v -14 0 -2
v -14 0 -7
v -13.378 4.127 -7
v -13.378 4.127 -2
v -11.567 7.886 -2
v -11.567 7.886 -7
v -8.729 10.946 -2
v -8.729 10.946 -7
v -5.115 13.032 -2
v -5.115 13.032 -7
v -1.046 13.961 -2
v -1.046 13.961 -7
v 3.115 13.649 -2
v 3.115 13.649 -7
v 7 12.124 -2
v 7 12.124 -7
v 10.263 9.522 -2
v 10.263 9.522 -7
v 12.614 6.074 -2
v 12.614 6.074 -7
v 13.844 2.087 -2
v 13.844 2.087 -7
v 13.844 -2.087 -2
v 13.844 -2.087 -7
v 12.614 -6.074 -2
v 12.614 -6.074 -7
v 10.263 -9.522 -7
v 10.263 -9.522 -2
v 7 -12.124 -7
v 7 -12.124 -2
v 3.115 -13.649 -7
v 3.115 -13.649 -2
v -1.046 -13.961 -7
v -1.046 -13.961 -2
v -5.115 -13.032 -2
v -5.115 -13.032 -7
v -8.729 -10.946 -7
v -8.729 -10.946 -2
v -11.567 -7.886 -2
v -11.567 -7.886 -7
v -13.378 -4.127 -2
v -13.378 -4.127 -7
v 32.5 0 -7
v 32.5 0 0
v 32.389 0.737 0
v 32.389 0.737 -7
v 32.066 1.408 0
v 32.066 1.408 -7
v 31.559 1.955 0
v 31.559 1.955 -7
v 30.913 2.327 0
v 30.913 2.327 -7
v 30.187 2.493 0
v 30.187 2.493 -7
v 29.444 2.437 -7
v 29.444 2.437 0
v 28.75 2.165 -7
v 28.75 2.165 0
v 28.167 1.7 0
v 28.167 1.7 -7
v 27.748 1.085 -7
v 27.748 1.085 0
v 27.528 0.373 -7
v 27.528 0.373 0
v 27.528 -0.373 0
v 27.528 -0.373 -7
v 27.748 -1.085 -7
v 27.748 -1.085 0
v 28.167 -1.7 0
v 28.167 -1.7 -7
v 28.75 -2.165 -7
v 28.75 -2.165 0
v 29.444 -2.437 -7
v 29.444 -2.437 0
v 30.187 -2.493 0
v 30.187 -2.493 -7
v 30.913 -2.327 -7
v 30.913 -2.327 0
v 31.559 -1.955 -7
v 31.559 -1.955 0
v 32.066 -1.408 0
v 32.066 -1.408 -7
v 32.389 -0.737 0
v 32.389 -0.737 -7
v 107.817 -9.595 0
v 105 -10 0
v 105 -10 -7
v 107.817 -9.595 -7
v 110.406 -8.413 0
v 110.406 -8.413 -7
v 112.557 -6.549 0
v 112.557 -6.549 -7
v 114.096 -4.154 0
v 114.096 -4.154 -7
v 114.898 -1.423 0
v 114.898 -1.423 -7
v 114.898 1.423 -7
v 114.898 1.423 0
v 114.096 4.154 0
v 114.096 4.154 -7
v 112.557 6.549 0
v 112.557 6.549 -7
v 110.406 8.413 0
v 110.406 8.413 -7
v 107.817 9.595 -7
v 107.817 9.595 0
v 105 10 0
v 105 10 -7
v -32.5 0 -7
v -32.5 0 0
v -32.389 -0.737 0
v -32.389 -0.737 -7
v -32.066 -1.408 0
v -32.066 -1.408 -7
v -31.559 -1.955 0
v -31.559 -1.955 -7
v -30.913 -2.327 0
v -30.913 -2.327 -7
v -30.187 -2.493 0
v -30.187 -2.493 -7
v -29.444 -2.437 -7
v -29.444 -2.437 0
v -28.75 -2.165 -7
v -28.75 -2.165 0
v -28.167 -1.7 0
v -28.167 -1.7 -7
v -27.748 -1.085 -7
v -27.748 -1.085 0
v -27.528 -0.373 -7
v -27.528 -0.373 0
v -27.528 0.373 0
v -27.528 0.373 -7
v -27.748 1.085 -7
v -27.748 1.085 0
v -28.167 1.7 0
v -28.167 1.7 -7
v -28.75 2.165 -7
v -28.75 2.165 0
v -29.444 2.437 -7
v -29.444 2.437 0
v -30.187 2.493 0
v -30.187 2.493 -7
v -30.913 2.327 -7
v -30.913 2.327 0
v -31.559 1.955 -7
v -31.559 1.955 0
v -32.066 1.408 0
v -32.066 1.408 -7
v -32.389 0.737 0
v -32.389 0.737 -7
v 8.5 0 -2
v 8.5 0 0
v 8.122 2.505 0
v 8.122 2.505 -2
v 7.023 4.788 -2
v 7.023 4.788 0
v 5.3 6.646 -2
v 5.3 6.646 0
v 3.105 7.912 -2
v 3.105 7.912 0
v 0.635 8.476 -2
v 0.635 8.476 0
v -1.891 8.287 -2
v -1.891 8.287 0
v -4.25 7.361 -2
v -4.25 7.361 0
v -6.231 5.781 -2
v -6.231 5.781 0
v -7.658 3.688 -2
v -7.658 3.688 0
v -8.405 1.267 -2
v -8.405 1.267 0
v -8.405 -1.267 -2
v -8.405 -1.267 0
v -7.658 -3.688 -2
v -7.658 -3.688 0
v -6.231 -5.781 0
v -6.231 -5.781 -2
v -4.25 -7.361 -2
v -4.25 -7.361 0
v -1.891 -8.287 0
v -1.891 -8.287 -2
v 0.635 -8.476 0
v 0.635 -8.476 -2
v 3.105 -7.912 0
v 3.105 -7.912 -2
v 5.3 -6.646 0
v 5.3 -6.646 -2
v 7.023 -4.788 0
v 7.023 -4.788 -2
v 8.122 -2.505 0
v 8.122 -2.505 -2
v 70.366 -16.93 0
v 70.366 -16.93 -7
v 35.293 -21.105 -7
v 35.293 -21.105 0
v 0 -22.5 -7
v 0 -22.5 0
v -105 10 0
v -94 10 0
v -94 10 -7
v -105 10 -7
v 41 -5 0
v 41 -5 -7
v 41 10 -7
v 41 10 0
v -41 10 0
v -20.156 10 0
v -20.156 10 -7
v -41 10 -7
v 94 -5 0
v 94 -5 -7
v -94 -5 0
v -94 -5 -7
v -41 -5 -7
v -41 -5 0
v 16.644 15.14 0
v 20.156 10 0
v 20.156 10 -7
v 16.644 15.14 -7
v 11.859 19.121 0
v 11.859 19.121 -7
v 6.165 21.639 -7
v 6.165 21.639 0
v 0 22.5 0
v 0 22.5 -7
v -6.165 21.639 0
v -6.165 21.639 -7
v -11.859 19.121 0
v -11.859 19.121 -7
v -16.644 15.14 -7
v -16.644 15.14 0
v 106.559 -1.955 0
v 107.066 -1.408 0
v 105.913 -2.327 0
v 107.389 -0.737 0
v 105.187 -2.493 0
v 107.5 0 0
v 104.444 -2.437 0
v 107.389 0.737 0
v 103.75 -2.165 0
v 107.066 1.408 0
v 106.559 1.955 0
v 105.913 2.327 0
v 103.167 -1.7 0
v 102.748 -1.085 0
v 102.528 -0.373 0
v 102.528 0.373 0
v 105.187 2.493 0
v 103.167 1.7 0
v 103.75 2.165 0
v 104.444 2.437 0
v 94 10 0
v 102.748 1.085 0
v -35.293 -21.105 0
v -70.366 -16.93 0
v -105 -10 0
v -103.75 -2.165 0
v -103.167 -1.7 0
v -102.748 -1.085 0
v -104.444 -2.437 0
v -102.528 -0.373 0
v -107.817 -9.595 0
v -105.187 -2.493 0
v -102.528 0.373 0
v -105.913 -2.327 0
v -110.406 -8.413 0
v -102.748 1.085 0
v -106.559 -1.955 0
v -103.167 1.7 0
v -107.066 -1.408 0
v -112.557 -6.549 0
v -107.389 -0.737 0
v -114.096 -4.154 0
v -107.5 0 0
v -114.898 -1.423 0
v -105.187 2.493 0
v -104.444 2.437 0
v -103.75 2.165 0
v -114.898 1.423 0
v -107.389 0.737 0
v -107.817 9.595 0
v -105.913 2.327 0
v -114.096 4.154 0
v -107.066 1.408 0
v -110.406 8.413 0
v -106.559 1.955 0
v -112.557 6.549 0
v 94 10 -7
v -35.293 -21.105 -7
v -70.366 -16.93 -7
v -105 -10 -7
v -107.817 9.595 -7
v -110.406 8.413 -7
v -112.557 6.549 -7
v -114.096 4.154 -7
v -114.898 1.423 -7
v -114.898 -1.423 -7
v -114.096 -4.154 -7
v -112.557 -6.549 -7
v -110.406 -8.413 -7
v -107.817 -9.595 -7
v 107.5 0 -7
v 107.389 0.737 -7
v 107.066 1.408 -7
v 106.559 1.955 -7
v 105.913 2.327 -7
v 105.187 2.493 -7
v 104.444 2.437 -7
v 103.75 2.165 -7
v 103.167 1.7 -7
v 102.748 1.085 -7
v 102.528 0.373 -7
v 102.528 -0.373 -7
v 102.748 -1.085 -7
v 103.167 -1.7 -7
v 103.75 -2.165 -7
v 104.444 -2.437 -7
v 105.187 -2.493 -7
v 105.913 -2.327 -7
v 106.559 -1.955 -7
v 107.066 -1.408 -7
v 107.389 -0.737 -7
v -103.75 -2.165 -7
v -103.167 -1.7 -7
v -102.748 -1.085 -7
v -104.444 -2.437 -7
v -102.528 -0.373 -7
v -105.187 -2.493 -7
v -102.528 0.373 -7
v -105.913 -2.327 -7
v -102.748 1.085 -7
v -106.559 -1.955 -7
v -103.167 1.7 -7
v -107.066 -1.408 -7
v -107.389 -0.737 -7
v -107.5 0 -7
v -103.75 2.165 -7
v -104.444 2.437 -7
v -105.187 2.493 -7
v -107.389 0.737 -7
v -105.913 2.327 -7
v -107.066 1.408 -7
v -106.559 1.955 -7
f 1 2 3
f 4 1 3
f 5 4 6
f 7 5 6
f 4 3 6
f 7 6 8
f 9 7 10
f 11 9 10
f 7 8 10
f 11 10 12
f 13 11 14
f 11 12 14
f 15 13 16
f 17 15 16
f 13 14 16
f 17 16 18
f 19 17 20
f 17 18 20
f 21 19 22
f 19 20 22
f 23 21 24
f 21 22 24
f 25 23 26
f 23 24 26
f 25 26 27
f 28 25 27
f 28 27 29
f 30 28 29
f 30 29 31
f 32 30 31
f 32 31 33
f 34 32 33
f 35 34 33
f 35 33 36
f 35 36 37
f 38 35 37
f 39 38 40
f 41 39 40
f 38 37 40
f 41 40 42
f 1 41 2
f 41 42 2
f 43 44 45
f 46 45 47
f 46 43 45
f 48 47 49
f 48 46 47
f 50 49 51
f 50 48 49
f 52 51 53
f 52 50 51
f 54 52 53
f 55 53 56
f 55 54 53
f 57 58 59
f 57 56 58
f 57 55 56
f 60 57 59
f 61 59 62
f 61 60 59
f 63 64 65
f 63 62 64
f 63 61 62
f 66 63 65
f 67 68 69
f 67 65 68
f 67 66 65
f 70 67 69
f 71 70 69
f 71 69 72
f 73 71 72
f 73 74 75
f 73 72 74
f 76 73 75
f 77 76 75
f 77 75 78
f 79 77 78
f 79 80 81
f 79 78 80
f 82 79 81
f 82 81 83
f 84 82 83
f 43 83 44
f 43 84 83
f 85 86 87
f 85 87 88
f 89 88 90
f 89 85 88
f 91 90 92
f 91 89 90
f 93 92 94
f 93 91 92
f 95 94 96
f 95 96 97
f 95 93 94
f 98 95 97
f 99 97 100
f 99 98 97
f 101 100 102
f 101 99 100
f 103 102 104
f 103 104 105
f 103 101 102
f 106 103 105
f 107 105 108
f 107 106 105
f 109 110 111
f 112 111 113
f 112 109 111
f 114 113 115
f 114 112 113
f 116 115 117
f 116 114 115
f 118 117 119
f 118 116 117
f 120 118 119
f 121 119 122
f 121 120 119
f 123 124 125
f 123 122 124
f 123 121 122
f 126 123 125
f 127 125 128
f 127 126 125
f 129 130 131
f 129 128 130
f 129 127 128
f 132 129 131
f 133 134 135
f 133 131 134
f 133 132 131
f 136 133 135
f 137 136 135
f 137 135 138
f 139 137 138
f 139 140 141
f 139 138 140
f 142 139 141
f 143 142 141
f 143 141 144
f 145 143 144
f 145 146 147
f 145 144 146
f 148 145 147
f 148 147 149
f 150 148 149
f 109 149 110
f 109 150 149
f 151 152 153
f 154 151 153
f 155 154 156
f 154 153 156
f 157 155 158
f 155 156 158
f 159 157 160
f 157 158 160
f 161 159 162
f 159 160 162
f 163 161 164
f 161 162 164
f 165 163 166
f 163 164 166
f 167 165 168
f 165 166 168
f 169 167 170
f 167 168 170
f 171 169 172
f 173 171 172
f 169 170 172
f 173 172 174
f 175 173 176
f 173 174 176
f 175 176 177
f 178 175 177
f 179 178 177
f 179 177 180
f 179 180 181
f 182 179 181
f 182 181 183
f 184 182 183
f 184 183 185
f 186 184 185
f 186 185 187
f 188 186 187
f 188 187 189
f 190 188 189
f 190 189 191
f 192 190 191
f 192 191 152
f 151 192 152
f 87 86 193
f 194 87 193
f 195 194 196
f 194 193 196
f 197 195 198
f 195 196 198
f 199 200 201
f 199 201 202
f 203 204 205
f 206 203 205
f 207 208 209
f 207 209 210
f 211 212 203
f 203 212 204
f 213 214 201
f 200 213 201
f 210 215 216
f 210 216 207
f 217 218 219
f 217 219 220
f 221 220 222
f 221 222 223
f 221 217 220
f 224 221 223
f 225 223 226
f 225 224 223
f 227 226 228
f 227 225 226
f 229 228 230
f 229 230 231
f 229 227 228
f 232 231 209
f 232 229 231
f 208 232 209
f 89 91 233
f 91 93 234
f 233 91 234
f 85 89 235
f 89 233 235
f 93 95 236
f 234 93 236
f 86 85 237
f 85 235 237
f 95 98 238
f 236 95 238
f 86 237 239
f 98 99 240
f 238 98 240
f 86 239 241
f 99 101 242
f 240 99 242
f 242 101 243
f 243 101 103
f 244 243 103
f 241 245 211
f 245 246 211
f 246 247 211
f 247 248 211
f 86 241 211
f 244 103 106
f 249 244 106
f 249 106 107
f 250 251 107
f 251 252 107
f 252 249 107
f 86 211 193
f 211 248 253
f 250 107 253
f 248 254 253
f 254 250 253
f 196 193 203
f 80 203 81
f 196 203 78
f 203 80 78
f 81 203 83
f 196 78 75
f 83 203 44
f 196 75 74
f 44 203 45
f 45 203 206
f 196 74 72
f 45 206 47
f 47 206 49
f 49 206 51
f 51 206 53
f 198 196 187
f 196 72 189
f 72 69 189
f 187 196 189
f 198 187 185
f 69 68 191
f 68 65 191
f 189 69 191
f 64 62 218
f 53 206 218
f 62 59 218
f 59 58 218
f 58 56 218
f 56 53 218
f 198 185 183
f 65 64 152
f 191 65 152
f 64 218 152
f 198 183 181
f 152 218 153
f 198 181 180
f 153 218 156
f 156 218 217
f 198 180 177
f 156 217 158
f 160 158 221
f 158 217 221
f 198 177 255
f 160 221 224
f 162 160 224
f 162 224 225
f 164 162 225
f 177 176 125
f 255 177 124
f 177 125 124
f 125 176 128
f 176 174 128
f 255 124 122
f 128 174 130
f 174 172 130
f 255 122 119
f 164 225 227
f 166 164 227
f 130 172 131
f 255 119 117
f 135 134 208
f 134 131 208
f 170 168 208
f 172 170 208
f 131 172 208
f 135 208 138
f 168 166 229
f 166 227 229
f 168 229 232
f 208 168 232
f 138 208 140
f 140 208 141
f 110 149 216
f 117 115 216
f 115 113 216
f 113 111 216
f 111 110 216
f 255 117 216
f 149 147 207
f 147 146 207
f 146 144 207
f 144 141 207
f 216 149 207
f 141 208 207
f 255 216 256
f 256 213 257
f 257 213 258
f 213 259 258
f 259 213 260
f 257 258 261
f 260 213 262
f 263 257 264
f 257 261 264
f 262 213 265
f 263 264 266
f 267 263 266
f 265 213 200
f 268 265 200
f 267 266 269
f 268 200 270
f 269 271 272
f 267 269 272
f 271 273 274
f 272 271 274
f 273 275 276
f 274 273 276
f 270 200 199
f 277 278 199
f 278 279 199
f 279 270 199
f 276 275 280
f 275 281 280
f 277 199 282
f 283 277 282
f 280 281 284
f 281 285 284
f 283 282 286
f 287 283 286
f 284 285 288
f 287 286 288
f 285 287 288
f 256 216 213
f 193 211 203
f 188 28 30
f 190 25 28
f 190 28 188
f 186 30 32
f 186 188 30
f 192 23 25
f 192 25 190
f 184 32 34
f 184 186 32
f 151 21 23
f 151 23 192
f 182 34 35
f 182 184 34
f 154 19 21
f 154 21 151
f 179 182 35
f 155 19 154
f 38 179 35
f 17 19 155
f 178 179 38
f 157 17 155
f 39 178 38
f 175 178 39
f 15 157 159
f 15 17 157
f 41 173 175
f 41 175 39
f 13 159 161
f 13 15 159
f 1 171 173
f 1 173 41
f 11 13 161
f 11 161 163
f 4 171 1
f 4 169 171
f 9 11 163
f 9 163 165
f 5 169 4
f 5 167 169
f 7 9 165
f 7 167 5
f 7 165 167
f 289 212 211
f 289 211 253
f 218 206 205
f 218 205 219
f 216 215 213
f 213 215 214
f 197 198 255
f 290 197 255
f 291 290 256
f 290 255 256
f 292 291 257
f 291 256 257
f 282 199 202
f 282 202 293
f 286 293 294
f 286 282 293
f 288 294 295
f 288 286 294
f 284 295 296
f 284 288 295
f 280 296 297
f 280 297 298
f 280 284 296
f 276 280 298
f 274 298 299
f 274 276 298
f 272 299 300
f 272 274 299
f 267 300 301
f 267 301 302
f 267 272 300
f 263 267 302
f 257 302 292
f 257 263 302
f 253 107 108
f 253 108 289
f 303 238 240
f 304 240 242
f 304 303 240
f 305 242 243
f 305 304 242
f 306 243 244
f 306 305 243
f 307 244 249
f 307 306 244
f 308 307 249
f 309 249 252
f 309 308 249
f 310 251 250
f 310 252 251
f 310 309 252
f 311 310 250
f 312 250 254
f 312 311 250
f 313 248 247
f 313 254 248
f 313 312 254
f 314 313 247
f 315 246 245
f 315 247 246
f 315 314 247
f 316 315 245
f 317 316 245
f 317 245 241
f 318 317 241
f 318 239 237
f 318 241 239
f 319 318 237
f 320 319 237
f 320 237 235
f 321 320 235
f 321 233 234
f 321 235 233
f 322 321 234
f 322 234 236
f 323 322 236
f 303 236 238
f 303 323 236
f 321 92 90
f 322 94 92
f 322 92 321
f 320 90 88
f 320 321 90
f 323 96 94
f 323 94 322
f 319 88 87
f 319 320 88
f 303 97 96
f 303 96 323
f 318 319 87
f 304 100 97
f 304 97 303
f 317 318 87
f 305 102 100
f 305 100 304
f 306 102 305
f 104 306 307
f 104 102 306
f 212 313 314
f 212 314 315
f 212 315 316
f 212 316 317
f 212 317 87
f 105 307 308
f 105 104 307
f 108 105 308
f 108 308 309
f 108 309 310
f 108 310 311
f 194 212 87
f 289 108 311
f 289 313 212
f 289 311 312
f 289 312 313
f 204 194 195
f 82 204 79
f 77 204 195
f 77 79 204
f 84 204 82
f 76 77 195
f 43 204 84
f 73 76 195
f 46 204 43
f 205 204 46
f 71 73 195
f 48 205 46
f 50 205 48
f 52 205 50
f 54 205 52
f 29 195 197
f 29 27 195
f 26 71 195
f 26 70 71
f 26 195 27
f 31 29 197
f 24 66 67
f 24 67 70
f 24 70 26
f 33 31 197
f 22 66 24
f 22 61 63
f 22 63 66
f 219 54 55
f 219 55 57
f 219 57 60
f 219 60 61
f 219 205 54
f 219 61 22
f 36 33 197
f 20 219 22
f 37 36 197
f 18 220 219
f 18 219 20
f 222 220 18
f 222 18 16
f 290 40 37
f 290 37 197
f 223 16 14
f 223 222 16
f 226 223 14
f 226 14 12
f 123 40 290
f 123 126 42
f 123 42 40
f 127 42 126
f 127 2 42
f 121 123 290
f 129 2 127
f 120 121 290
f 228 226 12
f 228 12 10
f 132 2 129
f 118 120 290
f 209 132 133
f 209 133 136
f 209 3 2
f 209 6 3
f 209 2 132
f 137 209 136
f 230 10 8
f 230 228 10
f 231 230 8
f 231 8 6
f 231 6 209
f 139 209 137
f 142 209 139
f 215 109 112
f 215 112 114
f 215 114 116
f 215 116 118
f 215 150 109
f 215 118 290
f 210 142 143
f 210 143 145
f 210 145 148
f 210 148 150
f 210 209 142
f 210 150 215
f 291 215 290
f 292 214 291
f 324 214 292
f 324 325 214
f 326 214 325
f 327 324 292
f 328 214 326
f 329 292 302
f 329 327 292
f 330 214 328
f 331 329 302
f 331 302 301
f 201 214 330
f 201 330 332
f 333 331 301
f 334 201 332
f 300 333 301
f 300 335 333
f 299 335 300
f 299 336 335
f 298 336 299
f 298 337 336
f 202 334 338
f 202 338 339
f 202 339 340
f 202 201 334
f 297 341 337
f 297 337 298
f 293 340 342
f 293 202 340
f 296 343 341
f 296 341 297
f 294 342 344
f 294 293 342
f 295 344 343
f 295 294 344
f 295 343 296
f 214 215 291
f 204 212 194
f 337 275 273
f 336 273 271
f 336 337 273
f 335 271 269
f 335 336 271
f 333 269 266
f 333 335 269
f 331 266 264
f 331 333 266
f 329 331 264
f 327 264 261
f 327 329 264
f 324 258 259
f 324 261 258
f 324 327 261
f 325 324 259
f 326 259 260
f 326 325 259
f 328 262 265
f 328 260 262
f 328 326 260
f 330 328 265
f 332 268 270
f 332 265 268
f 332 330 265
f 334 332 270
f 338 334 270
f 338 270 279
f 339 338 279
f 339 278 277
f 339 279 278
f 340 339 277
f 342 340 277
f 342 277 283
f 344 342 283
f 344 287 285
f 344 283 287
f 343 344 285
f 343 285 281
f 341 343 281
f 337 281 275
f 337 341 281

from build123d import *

# Parameters (mm, degrees)
SKETCH_1_R          = 8.5
EXTRUDE_1_DEPTH     = 7
SKETCH_3_R          = 14
CUT_EXTRUDE_2_DEPTH = 5
CUT_EXTRUDE_3_REACH = 119.389
SKETCH_4_R          = 2.5
CUT_EXTRUDE_5_REACH = 119.389
SKETCH_6_W          = 53
SKETCH_6_H          = 15
EXTRUDE_START       = -7
EXTRUDE_2_DEPTH     = 7


with BuildPart() as part:
    # 草图1 → 凸台-拉伸1 (new body)
    with BuildSketch(Plane.XY):
        with BuildLine():
            ThreePointArc((20.155644371, 10), (0, 22.5), (-20.155644371, 10))
            Line((-20.155644371, 10), (-105, 10))
            ThreePointArc((-105, 10), (-115, 0), (-105, -10))
            Line((-105, -10), (-20.155644371, -10))
            ThreePointArc((-20.155644371, -10), (0, -22.5), (20.155644371, -10))
            Line((20.155644371, -10), (105, -10))
            ThreePointArc((105, -10), (115, 0), (105, 10))
            Line((105, 10), (20.155644371, 10))
        make_face()
        Circle(SKETCH_1_R, mode=Mode.SUBTRACT)
    extrude(amount=-EXTRUDE_1_DEPTH)

    # 草图3 → 切除-拉伸2 (cut)
    with BuildSketch(Plane(origin=(0, 0, -7), x_dir=(-1, 0, 0), z_dir=(0, 0, -1))):
        Circle(SKETCH_3_R)
    extrude(amount=-CUT_EXTRUDE_2_DEPTH, mode=Mode.SUBTRACT)

    # 草图4 → 切除-拉伸3 (cut, up to next)
    with BuildSketch(Plane.XY.offset(-7), mode=Mode.PRIVATE) as cut_extrude_3_sk1:
        with Locations((30, 0)):
            Circle(SKETCH_4_R)
    cut_extrude_3_tool1 = extrude(cut_extrude_3_sk1.sketch, amount=CUT_EXTRUDE_3_REACH, mode=Mode.PRIVATE) & part.part
    # 草图4 → 切除-拉伸3 (cut, up to next)
    with BuildSketch(Plane.XY.offset(-7), mode=Mode.PRIVATE) as cut_extrude_3_sk2:
        with Locations((105, 0)):
            Circle(SKETCH_4_R)
    cut_extrude_3_tool2 = extrude(cut_extrude_3_sk2.sketch, amount=CUT_EXTRUDE_3_REACH, mode=Mode.PRIVATE) & part.part
    # 草图4 → 切除-拉伸3 (cut, up to next)
    with BuildSketch(Plane.XY.offset(-7), mode=Mode.PRIVATE) as cut_extrude_3_sk3:
        with Locations(Location((-105, 0, 0), (0, 0, 180))):
            Circle(SKETCH_4_R)
    cut_extrude_3_tool3 = extrude(cut_extrude_3_sk3.sketch, amount=CUT_EXTRUDE_3_REACH, mode=Mode.PRIVATE) & part.part
    # 草图4 → 切除-拉伸3 (cut, up to next)
    with BuildSketch(Plane.XY.offset(-7), mode=Mode.PRIVATE) as cut_extrude_3_sk4:
        with Locations(Location((-30, 0, 0), (0, 0, 180))):
            Circle(SKETCH_4_R)
    cut_extrude_3_tool4 = extrude(cut_extrude_3_sk4.sketch, amount=CUT_EXTRUDE_3_REACH, mode=Mode.PRIVATE) & part.part
    add(cut_extrude_3_tool1.solids().sort_by_distance((30, 0, -7))[0], mode=Mode.SUBTRACT)
    add(cut_extrude_3_tool2.solids().sort_by_distance((105, 0, -7))[0], mode=Mode.SUBTRACT)
    add(cut_extrude_3_tool3.solids().sort_by_distance((-105, 0, -7))[0], mode=Mode.SUBTRACT)
    add(cut_extrude_3_tool4.solids().sort_by_distance((-30, 0, -7))[0], mode=Mode.SUBTRACT)

    # 草图6 → 切除-拉伸5 (cut, up to next)
    with BuildSketch(Plane(origin=(0, 0, -7), x_dir=(-1, 0, 0), z_dir=(0, 0, -1)), mode=Mode.PRIVATE) as cut_extrude_5_sk1:
        with Locations((-67.5, 2.5)):
            Rectangle(SKETCH_6_W, SKETCH_6_H)
    cut_extrude_5_tool1 = extrude(cut_extrude_5_sk1.sketch, amount=-CUT_EXTRUDE_5_REACH, mode=Mode.PRIVATE) & part.part
    # 草图6 → 切除-拉伸5 (cut, up to next)
    with BuildSketch(Plane(origin=(0, 0, -7), x_dir=(-1, 0, 0), z_dir=(0, 0, -1)), mode=Mode.PRIVATE) as cut_extrude_5_sk2:
        with Locations((67.5, 2.5)):
            Rectangle(SKETCH_6_W, SKETCH_6_H)
    cut_extrude_5_tool2 = extrude(cut_extrude_5_sk2.sketch, amount=-CUT_EXTRUDE_5_REACH, mode=Mode.PRIVATE) & part.part
    add(cut_extrude_5_tool1.solids().sort_by_distance((67.5, 2.5, -7))[0], mode=Mode.SUBTRACT)
    add(cut_extrude_5_tool2.solids().sort_by_distance((-67.5, 2.5, -7))[0], mode=Mode.SUBTRACT)

    # 草图7 → 凸台-拉伸2 (add)
    with BuildSketch(Plane(origin=(0, 0, -7), x_dir=(-1, 0, 0), z_dir=(0, 0, -1)).offset(EXTRUDE_START)):
        with BuildLine():
            ThreePointArc((-105, -10), (-52.870714977, -19.364005631), (-4.1e-08, -22.5))
            ThreePointArc((-4.1e-08, -22.5), (-11.858541243, -19.121323165), (-20.155644371, -10))
            Line((-20.155644371, -10), (-105, -10))
        make_face()
        with BuildLine():
            Line((105, -10), (20.155644371, -10))
            ThreePointArc((20.155644371, -10), (11.858541208, -19.121323187), (-4.1e-08, -22.5))
            ThreePointArc((-4.1e-08, -22.5), (52.870714936, -19.364005636), (105, -10))
        make_face()
    extrude(amount=EXTRUDE_2_DEPTH)


solid = part.part
